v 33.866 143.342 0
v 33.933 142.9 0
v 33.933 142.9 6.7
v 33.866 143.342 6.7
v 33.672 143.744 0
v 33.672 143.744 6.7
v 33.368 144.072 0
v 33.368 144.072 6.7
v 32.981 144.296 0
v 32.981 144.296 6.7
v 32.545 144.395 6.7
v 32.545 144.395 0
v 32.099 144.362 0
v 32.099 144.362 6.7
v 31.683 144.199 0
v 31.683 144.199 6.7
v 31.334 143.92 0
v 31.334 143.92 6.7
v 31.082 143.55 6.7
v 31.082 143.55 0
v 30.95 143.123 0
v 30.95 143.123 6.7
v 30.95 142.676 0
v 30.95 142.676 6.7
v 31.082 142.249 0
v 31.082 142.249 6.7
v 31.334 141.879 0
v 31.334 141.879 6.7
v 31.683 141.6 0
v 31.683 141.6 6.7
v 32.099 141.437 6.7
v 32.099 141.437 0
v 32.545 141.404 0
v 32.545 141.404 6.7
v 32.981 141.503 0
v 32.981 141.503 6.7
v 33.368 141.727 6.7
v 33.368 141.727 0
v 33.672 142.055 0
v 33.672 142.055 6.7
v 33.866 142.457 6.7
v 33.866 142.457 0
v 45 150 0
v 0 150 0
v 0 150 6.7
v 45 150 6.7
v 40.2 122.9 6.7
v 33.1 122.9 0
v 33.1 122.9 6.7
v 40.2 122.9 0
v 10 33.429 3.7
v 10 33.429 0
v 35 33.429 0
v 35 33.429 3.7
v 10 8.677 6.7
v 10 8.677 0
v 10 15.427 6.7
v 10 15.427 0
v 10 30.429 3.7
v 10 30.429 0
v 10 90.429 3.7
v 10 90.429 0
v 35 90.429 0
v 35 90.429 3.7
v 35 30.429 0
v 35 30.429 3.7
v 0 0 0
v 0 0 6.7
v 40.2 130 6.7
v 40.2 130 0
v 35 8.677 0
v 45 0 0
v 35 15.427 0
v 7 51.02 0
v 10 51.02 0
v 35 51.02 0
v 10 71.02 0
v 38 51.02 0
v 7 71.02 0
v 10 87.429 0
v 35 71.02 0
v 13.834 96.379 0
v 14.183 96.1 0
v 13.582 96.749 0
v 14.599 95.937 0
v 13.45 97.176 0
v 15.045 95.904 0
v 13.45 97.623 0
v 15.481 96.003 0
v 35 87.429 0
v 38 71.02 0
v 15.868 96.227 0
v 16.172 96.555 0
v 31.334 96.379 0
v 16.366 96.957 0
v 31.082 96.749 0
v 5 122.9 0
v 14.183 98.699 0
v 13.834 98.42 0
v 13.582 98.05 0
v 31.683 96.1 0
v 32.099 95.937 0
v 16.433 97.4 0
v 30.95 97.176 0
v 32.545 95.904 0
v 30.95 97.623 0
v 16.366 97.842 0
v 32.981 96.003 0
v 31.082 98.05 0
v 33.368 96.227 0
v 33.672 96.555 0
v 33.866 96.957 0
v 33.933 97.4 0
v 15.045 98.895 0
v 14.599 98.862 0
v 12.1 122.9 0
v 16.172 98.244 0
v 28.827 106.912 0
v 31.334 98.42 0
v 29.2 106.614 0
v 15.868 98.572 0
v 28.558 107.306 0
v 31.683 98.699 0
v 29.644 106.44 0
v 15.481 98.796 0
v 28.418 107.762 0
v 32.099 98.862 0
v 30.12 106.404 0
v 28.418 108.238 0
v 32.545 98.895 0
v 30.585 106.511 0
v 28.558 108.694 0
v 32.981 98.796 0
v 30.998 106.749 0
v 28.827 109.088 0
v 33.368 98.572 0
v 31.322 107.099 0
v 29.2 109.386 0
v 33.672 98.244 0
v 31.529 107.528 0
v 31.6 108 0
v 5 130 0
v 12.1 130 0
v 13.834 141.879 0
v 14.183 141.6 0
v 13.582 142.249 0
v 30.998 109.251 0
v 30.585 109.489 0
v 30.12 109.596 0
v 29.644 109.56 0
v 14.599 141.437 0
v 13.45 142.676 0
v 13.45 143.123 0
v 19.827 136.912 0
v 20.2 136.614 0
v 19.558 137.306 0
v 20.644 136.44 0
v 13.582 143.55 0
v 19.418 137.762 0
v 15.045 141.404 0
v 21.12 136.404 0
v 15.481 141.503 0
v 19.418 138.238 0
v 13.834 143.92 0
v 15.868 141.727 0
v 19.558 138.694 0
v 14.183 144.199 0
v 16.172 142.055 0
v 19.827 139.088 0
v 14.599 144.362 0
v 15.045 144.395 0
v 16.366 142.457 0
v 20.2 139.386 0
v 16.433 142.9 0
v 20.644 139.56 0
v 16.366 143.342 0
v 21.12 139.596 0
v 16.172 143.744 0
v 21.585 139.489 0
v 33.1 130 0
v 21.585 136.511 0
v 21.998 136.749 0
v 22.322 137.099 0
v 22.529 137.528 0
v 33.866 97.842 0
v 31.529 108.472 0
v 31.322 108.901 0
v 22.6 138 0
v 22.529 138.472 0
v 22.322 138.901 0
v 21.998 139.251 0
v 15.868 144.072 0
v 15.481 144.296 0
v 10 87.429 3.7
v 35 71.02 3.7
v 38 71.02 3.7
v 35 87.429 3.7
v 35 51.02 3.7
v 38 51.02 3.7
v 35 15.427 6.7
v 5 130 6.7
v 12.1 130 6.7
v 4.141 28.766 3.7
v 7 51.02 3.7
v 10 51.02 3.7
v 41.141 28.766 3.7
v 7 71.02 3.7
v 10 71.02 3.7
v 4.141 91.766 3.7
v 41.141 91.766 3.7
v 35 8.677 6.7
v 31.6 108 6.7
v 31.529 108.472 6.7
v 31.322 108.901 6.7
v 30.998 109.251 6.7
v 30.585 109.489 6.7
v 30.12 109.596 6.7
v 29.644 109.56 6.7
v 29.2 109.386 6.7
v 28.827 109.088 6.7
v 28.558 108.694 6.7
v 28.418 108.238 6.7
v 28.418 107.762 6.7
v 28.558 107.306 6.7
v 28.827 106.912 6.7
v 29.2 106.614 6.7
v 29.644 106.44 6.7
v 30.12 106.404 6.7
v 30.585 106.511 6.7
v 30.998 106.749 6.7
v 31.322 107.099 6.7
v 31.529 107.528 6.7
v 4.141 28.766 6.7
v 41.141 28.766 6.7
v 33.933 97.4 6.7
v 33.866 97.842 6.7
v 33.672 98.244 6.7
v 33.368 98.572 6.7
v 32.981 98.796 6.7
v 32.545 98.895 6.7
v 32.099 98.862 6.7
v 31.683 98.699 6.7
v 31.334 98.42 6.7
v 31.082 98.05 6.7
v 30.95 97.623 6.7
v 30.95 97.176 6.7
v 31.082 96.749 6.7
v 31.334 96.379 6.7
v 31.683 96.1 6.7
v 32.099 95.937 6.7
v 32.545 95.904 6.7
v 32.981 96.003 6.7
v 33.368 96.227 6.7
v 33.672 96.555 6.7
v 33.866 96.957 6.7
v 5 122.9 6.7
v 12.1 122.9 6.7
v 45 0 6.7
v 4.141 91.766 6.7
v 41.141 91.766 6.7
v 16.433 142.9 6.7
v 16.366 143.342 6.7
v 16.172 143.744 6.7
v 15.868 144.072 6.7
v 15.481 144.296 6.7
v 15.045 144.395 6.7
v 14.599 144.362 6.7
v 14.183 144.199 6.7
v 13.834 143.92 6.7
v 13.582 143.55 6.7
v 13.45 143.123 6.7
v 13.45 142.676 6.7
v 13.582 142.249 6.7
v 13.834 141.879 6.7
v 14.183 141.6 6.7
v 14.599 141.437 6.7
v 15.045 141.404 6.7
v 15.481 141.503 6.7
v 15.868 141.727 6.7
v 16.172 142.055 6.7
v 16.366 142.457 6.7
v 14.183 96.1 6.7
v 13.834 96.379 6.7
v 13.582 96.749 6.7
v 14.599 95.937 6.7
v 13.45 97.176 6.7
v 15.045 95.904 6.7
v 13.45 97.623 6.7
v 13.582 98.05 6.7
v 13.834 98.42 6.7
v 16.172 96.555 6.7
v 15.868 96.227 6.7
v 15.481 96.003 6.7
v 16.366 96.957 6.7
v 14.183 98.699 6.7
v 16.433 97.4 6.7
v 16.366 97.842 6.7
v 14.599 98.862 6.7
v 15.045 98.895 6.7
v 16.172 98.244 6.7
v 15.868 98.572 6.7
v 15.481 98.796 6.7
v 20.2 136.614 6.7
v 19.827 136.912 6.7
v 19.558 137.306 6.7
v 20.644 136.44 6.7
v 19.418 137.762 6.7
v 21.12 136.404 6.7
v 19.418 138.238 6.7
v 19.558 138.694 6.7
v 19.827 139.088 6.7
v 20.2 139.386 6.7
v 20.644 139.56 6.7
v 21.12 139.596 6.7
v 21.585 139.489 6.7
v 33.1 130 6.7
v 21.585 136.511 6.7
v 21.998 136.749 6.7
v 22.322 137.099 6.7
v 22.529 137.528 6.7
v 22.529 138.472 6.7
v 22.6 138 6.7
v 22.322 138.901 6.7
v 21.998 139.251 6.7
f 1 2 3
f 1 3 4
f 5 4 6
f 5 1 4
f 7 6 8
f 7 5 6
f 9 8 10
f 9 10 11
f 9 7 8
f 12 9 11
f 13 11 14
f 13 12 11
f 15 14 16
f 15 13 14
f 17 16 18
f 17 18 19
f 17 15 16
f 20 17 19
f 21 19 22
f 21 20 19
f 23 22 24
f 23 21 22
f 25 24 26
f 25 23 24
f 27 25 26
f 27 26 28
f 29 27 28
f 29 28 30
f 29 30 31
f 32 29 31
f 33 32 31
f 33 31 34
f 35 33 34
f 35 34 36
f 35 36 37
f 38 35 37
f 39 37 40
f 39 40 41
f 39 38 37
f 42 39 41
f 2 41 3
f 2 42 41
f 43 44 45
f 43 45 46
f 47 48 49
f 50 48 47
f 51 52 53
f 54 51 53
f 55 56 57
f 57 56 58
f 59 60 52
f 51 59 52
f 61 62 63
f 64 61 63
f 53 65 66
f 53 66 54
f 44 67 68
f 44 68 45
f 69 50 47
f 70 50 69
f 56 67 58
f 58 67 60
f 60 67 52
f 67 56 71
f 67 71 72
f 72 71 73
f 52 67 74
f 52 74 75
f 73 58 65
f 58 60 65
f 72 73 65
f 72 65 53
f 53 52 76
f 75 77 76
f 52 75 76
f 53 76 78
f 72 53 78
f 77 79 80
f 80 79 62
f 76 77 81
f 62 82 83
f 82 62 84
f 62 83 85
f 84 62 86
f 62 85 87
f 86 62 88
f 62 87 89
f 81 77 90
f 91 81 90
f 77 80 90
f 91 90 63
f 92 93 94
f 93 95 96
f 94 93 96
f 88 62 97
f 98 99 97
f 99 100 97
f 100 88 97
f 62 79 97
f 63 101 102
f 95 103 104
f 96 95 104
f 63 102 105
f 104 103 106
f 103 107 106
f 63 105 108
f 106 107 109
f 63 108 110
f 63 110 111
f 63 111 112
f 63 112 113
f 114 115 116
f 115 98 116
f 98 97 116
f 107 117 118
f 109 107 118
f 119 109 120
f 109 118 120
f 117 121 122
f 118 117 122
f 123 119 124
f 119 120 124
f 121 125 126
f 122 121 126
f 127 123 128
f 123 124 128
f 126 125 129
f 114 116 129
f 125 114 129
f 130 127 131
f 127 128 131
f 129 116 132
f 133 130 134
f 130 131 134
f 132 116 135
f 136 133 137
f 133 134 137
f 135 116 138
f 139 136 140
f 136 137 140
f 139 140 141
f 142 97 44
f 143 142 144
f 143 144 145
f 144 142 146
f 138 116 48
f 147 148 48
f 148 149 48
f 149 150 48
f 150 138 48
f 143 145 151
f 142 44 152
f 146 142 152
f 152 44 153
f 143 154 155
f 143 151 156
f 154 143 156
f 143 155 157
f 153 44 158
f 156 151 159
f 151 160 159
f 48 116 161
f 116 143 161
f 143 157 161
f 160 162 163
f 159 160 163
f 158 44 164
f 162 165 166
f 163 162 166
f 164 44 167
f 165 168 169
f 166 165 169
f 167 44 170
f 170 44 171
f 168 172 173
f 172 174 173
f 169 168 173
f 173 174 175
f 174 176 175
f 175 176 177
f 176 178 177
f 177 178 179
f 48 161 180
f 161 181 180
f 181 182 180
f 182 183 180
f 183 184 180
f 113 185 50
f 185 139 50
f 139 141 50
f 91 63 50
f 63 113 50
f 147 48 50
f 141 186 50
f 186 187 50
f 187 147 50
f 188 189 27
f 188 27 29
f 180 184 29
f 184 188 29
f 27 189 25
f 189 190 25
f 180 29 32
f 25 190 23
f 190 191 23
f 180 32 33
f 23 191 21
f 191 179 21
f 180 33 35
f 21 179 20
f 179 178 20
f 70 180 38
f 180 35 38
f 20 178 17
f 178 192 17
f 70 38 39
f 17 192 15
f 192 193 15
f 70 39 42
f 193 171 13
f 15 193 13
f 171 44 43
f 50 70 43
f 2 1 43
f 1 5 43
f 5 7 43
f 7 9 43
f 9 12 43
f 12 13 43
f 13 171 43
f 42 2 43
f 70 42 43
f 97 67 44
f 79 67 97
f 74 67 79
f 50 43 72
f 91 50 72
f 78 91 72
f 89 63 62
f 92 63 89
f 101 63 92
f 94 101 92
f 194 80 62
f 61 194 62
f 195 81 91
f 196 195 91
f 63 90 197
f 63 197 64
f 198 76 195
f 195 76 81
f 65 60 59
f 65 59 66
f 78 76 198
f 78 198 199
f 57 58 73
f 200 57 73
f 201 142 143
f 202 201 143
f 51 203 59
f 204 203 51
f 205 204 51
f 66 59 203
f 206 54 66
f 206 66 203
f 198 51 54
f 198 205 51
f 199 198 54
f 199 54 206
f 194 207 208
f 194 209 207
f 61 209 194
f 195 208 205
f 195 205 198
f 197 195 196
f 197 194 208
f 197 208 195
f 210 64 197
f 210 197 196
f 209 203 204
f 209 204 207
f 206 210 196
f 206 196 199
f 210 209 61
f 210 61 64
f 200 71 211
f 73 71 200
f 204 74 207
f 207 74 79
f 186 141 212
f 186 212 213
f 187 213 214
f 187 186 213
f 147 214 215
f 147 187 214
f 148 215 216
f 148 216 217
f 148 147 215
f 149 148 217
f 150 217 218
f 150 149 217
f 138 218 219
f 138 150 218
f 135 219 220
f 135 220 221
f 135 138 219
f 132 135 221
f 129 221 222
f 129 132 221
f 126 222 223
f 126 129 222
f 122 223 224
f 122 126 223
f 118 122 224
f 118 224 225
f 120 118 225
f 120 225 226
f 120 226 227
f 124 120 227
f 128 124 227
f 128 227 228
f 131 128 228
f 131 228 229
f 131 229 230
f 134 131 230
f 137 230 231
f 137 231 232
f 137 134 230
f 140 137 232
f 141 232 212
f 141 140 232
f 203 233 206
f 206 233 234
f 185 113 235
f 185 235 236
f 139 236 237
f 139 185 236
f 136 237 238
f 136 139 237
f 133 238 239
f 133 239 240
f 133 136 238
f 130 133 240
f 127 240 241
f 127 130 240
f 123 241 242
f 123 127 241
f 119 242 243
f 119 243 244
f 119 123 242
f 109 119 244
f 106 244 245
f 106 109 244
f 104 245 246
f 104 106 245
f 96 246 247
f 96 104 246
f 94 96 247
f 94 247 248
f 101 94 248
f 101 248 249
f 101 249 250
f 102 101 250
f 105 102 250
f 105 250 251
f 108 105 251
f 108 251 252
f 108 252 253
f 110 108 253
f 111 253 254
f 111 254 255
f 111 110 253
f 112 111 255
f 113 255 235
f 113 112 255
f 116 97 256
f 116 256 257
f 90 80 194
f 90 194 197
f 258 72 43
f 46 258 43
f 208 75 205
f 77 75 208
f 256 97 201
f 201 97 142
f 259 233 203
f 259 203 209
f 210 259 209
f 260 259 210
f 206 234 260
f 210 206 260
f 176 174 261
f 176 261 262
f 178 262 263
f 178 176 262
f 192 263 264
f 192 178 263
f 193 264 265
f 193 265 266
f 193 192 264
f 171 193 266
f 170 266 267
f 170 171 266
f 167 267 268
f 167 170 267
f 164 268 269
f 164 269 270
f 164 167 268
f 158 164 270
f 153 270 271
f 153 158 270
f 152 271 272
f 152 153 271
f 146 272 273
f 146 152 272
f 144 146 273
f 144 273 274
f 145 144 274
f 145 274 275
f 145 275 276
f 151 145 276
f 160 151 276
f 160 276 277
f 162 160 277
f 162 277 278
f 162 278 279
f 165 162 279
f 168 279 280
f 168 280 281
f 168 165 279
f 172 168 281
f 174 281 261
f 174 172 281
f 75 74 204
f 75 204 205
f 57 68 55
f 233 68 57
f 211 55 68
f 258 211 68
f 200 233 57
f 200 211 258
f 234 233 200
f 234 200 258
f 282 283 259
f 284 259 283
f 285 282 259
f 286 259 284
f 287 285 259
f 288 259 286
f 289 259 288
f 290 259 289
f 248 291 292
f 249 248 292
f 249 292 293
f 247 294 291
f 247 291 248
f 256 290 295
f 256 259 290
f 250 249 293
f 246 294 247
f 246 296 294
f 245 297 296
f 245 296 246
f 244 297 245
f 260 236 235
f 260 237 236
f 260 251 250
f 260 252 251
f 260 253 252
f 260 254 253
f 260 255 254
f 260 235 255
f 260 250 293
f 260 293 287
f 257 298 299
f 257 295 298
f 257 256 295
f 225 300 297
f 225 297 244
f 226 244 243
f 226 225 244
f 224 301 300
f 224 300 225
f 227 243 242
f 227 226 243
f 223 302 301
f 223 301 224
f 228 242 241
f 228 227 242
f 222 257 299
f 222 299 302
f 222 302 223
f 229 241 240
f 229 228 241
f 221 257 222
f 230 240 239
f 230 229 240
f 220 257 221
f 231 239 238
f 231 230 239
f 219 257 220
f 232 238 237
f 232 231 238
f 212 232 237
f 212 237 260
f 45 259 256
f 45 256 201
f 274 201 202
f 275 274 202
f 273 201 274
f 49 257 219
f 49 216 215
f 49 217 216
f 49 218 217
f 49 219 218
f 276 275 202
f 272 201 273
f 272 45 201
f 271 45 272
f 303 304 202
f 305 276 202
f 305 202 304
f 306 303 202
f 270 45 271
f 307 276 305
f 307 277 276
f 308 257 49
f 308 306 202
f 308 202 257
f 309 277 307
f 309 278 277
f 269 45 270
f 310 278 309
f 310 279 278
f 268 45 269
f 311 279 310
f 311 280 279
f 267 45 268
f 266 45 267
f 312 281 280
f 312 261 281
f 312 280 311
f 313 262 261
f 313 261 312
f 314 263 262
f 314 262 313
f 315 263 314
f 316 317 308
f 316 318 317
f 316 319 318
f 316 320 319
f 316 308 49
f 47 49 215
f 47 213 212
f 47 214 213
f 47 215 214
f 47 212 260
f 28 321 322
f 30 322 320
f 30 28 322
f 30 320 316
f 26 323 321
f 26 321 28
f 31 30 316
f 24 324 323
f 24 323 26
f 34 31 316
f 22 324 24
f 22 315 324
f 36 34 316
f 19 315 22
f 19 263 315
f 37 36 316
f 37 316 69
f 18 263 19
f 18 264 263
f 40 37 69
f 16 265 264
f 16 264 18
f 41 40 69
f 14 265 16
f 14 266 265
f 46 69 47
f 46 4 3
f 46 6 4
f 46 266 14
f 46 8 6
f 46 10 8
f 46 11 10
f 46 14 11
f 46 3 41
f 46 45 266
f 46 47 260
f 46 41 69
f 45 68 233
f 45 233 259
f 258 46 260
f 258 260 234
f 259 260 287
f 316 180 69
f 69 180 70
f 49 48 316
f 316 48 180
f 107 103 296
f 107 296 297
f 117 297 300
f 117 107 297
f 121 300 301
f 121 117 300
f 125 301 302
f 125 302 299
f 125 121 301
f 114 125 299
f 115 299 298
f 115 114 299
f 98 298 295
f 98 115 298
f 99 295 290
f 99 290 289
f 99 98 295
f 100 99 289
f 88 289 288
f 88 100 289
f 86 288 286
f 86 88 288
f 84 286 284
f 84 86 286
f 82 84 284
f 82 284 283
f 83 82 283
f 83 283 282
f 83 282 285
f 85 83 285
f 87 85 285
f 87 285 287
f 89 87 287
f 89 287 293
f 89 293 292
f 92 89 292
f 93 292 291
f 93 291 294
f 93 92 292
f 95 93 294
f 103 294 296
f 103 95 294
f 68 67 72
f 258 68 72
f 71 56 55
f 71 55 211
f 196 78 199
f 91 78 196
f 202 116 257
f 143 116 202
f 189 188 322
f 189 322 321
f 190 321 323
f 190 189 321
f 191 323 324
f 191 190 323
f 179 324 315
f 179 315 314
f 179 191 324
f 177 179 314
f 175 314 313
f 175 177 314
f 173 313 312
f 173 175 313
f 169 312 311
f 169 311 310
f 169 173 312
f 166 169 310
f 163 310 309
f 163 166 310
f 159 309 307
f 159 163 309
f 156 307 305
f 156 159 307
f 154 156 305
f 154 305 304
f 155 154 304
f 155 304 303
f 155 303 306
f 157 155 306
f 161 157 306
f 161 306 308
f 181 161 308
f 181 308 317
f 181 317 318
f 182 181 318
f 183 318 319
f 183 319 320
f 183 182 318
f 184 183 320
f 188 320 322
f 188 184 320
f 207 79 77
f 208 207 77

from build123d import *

# Parameters (mm, degrees)
SKETCH_W     = 45
SKETCH_H     = 150
SKETCH_R     = 1.5
SKETCH_R_2   = 1.6
SKETCH_W_2   = 25
SKETCH_H_2   = 6.75
SKETCH_H_3   = 3
SKETCH_W_3   = 3
SKETCH_H_4   = 20
SKETCH_W_4   = 7.1
SKETCH_H_5   = 7.1
PAD_DEPTH    = 6.7
SKETCH001_W  = 37
SKETCH001_H  = 63
POCKET_DEPTH = 3


with BuildPart() as part:
    # Sketch → Pad (new body)
    with BuildSketch(Plane.XY):
        with Locations((22.5, 75)):
            Rectangle(SKETCH_W, SKETCH_H)
        with Locations((14.933079, 142.899511)):
            Circle(SKETCH_R, mode=Mode.SUBTRACT)
        with Locations((14.933079, 97.399511)):
            Circle(SKETCH_R, mode=Mode.SUBTRACT)
        with Locations((32.433079, 97.399511)):
            Circle(SKETCH_R, mode=Mode.SUBTRACT)
        with Locations((32.433079, 142.899511)):
            Circle(SKETCH_R, mode=Mode.SUBTRACT)
        with Locations((21, 138)):
            Circle(SKETCH_R_2, mode=Mode.SUBTRACT)
        with Locations((30, 108)):
            Circle(SKETCH_R_2, mode=Mode.SUBTRACT)
        with Locations((22.5, 12.052246)):
            Rectangle(SKETCH_W_2, SKETCH_H_2, mode=Mode.SUBTRACT)
        with Locations((22.5, 88.929037)):
            Rectangle(SKETCH_W_2, SKETCH_H_3, mode=Mode.SUBTRACT)
        with Locations((22.5, 31.929037)):
            Rectangle(SKETCH_W_2, SKETCH_H_3, mode=Mode.SUBTRACT)
        with Locations((8.5, 61.019528)):
            Rectangle(SKETCH_W_3, SKETCH_H_4, mode=Mode.SUBTRACT)
        with Locations((36.5, 61.019528)):
            Rectangle(SKETCH_W_3, SKETCH_H_4, mode=Mode.SUBTRACT)
        with Locations((8.55, 126.45)):
            Rectangle(SKETCH_W_4, SKETCH_H_5, mode=Mode.SUBTRACT)
        with Locations((36.65, 126.45)):
            Rectangle(SKETCH_W_4, SKETCH_H_5, mode=Mode.SUBTRACT)
    extrude(amount=PAD_DEPTH)

    # Sketch001 (on Face34 of Pad) → Pocket (cut)
    with BuildSketch(Plane.XY.offset(6.7)):
        with Locations((22.640953, 60.266175)):
            Rectangle(SKETCH001_W, SKETCH001_H)
    extrude(amount=-POCKET_DEPTH, mode=Mode.SUBTRACT)


solid = part.part
